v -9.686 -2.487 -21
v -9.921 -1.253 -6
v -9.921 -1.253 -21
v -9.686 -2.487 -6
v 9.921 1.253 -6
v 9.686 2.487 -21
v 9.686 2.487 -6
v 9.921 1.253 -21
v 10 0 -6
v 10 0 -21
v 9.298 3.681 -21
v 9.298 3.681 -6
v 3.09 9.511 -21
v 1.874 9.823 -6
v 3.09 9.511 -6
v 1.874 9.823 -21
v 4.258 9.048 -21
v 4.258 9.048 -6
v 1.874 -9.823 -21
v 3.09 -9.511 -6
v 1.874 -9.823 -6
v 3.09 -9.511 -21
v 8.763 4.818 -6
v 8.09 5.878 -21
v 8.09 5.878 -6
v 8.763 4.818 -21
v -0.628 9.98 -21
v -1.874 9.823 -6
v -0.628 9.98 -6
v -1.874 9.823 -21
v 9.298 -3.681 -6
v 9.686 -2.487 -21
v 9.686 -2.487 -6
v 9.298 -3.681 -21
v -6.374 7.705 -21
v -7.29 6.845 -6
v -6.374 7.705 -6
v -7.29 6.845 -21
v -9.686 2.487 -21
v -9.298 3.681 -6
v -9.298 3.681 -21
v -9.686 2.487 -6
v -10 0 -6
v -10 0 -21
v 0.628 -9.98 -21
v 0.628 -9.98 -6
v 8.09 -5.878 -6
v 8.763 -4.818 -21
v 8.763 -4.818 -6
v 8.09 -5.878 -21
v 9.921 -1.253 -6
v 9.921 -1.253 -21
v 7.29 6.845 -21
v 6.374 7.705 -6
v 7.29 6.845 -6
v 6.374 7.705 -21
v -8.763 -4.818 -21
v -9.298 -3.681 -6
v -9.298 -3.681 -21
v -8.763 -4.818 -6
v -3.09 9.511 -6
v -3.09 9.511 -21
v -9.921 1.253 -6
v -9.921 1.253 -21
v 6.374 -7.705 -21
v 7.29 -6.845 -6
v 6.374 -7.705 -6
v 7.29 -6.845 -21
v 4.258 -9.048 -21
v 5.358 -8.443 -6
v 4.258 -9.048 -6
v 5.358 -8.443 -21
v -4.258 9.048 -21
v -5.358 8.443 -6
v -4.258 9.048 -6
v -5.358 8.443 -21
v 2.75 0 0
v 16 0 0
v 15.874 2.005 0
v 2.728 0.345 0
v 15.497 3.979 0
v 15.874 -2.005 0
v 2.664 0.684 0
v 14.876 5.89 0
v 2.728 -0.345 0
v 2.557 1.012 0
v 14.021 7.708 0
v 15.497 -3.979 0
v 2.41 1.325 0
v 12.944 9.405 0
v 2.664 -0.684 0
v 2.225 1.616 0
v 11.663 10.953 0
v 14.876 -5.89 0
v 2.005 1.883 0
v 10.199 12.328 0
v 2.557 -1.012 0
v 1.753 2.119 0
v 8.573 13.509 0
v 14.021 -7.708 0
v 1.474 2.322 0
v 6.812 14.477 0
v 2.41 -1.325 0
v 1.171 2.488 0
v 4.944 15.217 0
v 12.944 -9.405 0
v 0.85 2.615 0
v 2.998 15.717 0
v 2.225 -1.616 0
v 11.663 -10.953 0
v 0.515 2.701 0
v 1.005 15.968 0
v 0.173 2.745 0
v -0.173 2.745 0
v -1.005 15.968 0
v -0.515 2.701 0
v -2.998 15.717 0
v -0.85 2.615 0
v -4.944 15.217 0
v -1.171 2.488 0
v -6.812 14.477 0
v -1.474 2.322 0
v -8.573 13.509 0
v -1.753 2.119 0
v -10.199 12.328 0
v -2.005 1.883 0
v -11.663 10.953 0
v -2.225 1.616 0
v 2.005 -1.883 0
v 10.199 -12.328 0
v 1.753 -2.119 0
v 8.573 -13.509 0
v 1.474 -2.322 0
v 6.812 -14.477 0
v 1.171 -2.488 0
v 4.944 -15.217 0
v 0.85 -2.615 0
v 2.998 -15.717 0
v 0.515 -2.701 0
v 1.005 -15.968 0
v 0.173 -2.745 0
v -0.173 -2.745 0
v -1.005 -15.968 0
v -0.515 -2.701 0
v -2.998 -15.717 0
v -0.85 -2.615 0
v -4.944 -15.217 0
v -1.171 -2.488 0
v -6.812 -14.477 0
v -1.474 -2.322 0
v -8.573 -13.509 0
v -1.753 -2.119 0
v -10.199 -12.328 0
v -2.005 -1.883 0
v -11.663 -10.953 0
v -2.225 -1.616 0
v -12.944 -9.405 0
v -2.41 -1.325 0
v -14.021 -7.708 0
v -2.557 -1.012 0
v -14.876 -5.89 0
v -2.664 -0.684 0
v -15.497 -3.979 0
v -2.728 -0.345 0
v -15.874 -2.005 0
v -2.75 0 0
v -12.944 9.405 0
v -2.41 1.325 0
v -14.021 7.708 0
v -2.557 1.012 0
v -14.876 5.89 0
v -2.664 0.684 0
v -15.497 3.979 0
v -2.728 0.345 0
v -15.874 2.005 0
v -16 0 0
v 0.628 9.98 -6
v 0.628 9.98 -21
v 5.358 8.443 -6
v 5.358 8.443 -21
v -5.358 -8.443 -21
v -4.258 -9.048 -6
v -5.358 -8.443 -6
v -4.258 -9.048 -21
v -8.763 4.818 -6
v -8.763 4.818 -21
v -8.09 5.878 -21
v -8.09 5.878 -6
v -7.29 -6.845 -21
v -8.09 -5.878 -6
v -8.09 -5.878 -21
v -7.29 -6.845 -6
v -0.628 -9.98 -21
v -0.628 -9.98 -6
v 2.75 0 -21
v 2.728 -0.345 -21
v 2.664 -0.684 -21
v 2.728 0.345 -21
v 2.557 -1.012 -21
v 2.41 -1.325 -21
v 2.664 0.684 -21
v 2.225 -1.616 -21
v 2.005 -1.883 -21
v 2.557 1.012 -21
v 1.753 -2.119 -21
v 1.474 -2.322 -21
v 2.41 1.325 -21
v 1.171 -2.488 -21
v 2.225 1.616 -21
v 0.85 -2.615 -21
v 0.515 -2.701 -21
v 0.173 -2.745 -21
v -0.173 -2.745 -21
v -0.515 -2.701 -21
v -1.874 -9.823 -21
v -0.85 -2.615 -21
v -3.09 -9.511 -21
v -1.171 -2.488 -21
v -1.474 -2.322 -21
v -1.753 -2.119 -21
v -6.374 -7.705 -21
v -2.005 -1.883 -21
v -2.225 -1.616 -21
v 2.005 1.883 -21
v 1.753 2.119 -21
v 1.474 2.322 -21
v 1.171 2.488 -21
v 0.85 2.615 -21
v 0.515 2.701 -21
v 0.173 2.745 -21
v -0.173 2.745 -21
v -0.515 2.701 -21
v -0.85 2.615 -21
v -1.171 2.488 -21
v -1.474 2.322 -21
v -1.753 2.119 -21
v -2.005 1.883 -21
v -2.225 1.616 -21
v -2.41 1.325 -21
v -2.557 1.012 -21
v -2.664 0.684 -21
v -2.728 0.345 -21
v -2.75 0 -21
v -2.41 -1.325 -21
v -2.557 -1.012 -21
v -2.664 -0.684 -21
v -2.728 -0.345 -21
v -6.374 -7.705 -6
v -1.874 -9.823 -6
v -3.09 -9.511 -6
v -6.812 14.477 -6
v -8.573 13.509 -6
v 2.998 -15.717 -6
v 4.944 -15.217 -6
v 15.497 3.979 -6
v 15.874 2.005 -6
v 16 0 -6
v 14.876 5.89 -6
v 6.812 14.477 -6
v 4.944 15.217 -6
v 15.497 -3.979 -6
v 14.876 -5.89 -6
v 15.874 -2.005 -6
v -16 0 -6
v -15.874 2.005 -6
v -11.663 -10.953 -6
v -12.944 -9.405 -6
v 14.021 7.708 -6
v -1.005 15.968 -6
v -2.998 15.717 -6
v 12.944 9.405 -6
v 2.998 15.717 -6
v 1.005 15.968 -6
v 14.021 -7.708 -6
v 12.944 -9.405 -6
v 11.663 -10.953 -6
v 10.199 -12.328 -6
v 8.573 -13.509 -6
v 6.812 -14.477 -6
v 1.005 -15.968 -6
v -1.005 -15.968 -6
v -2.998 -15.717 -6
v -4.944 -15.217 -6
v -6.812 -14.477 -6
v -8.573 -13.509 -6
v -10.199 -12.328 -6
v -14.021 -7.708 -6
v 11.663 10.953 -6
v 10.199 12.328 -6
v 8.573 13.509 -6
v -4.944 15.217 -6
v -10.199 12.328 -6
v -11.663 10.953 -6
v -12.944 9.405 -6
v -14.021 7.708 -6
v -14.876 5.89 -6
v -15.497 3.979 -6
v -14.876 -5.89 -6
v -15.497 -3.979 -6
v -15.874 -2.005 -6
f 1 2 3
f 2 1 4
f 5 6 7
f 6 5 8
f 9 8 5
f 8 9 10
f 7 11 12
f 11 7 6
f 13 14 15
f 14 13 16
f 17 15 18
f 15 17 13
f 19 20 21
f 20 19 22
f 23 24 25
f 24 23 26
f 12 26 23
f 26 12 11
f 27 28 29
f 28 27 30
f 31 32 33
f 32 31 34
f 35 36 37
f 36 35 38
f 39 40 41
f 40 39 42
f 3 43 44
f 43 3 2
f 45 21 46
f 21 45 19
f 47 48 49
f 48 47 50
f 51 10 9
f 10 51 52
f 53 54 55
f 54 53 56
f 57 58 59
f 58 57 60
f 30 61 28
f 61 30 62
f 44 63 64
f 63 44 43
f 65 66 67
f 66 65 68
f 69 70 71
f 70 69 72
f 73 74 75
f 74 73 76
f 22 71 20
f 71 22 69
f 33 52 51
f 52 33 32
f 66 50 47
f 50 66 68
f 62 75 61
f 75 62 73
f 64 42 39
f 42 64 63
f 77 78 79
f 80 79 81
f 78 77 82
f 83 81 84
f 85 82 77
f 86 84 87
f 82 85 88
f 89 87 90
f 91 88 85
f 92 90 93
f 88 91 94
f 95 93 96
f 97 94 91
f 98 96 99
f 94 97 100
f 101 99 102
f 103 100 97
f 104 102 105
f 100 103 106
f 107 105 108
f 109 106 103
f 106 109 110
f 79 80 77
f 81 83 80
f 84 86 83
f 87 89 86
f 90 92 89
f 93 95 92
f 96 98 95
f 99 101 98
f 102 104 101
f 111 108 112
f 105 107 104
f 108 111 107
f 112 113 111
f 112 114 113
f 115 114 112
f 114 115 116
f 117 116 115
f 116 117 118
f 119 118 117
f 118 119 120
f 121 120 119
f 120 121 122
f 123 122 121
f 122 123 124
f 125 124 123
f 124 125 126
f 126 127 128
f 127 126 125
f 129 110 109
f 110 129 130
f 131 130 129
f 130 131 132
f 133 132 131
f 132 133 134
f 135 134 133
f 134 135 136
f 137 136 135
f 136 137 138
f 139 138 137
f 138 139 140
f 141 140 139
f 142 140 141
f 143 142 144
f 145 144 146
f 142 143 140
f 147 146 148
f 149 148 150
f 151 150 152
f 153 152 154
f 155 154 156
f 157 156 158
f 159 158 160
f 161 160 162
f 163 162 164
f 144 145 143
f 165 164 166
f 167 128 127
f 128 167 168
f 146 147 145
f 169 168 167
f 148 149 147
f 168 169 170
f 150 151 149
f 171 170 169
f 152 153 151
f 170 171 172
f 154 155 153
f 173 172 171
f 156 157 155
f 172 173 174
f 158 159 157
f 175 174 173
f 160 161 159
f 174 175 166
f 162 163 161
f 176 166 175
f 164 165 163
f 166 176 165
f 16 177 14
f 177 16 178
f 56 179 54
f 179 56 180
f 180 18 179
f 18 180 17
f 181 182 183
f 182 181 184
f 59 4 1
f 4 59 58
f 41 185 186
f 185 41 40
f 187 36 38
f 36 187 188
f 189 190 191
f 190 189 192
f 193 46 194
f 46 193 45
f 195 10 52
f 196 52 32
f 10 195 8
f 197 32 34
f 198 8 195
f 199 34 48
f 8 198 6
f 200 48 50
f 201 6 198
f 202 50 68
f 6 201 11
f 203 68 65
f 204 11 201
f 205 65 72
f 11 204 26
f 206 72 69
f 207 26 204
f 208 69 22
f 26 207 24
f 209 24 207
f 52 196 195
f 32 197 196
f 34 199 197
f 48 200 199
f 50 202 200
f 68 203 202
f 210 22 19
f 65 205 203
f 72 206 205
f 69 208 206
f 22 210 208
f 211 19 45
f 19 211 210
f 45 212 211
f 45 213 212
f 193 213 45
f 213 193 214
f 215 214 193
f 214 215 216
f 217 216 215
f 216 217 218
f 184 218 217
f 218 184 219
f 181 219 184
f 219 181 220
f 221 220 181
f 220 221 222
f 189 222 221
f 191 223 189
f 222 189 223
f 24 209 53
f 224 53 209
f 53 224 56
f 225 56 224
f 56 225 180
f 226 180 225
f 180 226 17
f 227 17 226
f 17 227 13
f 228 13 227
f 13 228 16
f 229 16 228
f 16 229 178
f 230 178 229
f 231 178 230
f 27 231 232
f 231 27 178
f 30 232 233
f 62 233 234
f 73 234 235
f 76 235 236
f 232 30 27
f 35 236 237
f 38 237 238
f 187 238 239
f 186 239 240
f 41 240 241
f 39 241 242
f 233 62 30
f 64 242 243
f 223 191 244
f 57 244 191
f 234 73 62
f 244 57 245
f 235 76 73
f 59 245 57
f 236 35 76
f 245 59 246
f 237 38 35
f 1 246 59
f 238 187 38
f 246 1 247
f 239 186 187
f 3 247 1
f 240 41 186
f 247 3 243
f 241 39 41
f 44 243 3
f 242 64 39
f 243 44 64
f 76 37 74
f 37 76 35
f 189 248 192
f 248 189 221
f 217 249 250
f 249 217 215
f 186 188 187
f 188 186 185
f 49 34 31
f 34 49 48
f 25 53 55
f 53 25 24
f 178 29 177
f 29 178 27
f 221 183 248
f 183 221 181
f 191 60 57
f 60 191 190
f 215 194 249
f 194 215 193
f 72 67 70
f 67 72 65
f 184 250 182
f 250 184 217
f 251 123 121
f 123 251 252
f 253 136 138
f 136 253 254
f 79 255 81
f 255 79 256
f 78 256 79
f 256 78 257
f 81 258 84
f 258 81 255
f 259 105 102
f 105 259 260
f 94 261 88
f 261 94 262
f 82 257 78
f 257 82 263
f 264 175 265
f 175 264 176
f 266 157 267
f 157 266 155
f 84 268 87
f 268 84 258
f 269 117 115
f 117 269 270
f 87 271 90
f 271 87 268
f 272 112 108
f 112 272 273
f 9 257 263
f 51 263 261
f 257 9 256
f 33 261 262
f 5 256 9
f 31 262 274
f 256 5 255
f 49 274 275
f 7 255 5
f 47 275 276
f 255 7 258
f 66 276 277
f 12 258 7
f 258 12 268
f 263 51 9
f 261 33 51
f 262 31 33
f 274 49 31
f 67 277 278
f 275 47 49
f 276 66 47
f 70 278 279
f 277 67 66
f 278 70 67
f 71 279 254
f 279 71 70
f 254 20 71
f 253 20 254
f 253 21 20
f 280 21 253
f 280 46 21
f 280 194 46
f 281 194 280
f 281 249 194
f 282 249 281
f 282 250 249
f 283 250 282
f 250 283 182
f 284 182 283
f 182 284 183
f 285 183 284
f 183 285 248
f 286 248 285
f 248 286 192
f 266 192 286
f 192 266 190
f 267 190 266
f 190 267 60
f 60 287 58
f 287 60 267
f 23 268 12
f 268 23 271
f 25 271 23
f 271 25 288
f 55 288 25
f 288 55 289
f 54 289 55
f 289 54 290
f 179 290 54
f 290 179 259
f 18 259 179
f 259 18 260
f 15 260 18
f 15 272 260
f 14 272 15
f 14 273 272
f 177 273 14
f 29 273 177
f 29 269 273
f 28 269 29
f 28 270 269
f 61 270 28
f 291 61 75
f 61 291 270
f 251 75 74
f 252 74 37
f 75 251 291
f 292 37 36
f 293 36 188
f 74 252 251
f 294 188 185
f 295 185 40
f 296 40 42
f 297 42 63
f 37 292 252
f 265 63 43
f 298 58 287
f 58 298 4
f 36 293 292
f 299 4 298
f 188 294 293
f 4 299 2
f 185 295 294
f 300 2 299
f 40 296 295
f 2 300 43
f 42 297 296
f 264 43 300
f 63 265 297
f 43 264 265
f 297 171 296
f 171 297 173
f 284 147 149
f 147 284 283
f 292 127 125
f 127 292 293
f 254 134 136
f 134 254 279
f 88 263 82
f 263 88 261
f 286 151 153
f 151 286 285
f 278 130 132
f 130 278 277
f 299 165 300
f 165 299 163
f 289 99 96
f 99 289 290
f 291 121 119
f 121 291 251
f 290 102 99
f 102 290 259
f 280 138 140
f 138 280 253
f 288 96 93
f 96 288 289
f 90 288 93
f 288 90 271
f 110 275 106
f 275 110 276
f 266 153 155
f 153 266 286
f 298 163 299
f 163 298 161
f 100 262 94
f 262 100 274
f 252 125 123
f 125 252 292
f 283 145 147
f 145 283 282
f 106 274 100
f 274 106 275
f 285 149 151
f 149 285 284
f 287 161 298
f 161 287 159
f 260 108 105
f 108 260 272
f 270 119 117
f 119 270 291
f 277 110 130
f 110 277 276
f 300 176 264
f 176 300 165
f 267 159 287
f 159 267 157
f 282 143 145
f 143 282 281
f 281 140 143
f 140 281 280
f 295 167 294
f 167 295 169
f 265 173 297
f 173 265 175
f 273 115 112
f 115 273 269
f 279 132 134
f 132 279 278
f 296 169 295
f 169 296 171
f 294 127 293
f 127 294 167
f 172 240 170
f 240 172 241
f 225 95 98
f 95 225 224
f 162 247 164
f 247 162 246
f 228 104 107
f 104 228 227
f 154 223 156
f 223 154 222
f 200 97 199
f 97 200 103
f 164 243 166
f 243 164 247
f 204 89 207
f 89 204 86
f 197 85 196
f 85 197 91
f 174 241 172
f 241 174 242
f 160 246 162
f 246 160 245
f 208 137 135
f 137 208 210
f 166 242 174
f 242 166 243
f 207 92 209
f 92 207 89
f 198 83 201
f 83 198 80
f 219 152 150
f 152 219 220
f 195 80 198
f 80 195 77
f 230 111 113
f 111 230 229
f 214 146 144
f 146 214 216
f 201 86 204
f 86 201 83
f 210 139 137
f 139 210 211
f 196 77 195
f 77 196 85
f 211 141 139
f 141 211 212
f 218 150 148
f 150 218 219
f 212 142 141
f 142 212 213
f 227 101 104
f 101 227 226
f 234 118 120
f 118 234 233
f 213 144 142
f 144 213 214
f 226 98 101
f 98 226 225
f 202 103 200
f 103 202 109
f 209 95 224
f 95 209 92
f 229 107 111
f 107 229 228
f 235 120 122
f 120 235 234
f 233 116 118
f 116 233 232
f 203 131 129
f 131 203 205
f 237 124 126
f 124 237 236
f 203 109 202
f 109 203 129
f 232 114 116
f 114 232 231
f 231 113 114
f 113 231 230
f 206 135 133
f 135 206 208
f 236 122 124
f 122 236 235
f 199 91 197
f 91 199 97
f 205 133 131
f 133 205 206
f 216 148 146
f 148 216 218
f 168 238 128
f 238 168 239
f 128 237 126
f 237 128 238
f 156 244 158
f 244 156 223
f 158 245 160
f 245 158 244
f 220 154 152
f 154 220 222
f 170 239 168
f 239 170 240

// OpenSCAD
$fn = 50;


difference() {
	union() {
		translate(v = [0, 0, -21.0000000000]) {
			cylinder(h = 21, r = 10.0000000000);
		}
		translate(v = [0, 0, -6.0000000000]) {
			cylinder(h = 6, r = 16.0000000000);
		}
	}
	union() {
		#translate(v = [0, 0, -21]) {
			cylinder(h = 21, r = 2.7500000000);
		}
	}
}
